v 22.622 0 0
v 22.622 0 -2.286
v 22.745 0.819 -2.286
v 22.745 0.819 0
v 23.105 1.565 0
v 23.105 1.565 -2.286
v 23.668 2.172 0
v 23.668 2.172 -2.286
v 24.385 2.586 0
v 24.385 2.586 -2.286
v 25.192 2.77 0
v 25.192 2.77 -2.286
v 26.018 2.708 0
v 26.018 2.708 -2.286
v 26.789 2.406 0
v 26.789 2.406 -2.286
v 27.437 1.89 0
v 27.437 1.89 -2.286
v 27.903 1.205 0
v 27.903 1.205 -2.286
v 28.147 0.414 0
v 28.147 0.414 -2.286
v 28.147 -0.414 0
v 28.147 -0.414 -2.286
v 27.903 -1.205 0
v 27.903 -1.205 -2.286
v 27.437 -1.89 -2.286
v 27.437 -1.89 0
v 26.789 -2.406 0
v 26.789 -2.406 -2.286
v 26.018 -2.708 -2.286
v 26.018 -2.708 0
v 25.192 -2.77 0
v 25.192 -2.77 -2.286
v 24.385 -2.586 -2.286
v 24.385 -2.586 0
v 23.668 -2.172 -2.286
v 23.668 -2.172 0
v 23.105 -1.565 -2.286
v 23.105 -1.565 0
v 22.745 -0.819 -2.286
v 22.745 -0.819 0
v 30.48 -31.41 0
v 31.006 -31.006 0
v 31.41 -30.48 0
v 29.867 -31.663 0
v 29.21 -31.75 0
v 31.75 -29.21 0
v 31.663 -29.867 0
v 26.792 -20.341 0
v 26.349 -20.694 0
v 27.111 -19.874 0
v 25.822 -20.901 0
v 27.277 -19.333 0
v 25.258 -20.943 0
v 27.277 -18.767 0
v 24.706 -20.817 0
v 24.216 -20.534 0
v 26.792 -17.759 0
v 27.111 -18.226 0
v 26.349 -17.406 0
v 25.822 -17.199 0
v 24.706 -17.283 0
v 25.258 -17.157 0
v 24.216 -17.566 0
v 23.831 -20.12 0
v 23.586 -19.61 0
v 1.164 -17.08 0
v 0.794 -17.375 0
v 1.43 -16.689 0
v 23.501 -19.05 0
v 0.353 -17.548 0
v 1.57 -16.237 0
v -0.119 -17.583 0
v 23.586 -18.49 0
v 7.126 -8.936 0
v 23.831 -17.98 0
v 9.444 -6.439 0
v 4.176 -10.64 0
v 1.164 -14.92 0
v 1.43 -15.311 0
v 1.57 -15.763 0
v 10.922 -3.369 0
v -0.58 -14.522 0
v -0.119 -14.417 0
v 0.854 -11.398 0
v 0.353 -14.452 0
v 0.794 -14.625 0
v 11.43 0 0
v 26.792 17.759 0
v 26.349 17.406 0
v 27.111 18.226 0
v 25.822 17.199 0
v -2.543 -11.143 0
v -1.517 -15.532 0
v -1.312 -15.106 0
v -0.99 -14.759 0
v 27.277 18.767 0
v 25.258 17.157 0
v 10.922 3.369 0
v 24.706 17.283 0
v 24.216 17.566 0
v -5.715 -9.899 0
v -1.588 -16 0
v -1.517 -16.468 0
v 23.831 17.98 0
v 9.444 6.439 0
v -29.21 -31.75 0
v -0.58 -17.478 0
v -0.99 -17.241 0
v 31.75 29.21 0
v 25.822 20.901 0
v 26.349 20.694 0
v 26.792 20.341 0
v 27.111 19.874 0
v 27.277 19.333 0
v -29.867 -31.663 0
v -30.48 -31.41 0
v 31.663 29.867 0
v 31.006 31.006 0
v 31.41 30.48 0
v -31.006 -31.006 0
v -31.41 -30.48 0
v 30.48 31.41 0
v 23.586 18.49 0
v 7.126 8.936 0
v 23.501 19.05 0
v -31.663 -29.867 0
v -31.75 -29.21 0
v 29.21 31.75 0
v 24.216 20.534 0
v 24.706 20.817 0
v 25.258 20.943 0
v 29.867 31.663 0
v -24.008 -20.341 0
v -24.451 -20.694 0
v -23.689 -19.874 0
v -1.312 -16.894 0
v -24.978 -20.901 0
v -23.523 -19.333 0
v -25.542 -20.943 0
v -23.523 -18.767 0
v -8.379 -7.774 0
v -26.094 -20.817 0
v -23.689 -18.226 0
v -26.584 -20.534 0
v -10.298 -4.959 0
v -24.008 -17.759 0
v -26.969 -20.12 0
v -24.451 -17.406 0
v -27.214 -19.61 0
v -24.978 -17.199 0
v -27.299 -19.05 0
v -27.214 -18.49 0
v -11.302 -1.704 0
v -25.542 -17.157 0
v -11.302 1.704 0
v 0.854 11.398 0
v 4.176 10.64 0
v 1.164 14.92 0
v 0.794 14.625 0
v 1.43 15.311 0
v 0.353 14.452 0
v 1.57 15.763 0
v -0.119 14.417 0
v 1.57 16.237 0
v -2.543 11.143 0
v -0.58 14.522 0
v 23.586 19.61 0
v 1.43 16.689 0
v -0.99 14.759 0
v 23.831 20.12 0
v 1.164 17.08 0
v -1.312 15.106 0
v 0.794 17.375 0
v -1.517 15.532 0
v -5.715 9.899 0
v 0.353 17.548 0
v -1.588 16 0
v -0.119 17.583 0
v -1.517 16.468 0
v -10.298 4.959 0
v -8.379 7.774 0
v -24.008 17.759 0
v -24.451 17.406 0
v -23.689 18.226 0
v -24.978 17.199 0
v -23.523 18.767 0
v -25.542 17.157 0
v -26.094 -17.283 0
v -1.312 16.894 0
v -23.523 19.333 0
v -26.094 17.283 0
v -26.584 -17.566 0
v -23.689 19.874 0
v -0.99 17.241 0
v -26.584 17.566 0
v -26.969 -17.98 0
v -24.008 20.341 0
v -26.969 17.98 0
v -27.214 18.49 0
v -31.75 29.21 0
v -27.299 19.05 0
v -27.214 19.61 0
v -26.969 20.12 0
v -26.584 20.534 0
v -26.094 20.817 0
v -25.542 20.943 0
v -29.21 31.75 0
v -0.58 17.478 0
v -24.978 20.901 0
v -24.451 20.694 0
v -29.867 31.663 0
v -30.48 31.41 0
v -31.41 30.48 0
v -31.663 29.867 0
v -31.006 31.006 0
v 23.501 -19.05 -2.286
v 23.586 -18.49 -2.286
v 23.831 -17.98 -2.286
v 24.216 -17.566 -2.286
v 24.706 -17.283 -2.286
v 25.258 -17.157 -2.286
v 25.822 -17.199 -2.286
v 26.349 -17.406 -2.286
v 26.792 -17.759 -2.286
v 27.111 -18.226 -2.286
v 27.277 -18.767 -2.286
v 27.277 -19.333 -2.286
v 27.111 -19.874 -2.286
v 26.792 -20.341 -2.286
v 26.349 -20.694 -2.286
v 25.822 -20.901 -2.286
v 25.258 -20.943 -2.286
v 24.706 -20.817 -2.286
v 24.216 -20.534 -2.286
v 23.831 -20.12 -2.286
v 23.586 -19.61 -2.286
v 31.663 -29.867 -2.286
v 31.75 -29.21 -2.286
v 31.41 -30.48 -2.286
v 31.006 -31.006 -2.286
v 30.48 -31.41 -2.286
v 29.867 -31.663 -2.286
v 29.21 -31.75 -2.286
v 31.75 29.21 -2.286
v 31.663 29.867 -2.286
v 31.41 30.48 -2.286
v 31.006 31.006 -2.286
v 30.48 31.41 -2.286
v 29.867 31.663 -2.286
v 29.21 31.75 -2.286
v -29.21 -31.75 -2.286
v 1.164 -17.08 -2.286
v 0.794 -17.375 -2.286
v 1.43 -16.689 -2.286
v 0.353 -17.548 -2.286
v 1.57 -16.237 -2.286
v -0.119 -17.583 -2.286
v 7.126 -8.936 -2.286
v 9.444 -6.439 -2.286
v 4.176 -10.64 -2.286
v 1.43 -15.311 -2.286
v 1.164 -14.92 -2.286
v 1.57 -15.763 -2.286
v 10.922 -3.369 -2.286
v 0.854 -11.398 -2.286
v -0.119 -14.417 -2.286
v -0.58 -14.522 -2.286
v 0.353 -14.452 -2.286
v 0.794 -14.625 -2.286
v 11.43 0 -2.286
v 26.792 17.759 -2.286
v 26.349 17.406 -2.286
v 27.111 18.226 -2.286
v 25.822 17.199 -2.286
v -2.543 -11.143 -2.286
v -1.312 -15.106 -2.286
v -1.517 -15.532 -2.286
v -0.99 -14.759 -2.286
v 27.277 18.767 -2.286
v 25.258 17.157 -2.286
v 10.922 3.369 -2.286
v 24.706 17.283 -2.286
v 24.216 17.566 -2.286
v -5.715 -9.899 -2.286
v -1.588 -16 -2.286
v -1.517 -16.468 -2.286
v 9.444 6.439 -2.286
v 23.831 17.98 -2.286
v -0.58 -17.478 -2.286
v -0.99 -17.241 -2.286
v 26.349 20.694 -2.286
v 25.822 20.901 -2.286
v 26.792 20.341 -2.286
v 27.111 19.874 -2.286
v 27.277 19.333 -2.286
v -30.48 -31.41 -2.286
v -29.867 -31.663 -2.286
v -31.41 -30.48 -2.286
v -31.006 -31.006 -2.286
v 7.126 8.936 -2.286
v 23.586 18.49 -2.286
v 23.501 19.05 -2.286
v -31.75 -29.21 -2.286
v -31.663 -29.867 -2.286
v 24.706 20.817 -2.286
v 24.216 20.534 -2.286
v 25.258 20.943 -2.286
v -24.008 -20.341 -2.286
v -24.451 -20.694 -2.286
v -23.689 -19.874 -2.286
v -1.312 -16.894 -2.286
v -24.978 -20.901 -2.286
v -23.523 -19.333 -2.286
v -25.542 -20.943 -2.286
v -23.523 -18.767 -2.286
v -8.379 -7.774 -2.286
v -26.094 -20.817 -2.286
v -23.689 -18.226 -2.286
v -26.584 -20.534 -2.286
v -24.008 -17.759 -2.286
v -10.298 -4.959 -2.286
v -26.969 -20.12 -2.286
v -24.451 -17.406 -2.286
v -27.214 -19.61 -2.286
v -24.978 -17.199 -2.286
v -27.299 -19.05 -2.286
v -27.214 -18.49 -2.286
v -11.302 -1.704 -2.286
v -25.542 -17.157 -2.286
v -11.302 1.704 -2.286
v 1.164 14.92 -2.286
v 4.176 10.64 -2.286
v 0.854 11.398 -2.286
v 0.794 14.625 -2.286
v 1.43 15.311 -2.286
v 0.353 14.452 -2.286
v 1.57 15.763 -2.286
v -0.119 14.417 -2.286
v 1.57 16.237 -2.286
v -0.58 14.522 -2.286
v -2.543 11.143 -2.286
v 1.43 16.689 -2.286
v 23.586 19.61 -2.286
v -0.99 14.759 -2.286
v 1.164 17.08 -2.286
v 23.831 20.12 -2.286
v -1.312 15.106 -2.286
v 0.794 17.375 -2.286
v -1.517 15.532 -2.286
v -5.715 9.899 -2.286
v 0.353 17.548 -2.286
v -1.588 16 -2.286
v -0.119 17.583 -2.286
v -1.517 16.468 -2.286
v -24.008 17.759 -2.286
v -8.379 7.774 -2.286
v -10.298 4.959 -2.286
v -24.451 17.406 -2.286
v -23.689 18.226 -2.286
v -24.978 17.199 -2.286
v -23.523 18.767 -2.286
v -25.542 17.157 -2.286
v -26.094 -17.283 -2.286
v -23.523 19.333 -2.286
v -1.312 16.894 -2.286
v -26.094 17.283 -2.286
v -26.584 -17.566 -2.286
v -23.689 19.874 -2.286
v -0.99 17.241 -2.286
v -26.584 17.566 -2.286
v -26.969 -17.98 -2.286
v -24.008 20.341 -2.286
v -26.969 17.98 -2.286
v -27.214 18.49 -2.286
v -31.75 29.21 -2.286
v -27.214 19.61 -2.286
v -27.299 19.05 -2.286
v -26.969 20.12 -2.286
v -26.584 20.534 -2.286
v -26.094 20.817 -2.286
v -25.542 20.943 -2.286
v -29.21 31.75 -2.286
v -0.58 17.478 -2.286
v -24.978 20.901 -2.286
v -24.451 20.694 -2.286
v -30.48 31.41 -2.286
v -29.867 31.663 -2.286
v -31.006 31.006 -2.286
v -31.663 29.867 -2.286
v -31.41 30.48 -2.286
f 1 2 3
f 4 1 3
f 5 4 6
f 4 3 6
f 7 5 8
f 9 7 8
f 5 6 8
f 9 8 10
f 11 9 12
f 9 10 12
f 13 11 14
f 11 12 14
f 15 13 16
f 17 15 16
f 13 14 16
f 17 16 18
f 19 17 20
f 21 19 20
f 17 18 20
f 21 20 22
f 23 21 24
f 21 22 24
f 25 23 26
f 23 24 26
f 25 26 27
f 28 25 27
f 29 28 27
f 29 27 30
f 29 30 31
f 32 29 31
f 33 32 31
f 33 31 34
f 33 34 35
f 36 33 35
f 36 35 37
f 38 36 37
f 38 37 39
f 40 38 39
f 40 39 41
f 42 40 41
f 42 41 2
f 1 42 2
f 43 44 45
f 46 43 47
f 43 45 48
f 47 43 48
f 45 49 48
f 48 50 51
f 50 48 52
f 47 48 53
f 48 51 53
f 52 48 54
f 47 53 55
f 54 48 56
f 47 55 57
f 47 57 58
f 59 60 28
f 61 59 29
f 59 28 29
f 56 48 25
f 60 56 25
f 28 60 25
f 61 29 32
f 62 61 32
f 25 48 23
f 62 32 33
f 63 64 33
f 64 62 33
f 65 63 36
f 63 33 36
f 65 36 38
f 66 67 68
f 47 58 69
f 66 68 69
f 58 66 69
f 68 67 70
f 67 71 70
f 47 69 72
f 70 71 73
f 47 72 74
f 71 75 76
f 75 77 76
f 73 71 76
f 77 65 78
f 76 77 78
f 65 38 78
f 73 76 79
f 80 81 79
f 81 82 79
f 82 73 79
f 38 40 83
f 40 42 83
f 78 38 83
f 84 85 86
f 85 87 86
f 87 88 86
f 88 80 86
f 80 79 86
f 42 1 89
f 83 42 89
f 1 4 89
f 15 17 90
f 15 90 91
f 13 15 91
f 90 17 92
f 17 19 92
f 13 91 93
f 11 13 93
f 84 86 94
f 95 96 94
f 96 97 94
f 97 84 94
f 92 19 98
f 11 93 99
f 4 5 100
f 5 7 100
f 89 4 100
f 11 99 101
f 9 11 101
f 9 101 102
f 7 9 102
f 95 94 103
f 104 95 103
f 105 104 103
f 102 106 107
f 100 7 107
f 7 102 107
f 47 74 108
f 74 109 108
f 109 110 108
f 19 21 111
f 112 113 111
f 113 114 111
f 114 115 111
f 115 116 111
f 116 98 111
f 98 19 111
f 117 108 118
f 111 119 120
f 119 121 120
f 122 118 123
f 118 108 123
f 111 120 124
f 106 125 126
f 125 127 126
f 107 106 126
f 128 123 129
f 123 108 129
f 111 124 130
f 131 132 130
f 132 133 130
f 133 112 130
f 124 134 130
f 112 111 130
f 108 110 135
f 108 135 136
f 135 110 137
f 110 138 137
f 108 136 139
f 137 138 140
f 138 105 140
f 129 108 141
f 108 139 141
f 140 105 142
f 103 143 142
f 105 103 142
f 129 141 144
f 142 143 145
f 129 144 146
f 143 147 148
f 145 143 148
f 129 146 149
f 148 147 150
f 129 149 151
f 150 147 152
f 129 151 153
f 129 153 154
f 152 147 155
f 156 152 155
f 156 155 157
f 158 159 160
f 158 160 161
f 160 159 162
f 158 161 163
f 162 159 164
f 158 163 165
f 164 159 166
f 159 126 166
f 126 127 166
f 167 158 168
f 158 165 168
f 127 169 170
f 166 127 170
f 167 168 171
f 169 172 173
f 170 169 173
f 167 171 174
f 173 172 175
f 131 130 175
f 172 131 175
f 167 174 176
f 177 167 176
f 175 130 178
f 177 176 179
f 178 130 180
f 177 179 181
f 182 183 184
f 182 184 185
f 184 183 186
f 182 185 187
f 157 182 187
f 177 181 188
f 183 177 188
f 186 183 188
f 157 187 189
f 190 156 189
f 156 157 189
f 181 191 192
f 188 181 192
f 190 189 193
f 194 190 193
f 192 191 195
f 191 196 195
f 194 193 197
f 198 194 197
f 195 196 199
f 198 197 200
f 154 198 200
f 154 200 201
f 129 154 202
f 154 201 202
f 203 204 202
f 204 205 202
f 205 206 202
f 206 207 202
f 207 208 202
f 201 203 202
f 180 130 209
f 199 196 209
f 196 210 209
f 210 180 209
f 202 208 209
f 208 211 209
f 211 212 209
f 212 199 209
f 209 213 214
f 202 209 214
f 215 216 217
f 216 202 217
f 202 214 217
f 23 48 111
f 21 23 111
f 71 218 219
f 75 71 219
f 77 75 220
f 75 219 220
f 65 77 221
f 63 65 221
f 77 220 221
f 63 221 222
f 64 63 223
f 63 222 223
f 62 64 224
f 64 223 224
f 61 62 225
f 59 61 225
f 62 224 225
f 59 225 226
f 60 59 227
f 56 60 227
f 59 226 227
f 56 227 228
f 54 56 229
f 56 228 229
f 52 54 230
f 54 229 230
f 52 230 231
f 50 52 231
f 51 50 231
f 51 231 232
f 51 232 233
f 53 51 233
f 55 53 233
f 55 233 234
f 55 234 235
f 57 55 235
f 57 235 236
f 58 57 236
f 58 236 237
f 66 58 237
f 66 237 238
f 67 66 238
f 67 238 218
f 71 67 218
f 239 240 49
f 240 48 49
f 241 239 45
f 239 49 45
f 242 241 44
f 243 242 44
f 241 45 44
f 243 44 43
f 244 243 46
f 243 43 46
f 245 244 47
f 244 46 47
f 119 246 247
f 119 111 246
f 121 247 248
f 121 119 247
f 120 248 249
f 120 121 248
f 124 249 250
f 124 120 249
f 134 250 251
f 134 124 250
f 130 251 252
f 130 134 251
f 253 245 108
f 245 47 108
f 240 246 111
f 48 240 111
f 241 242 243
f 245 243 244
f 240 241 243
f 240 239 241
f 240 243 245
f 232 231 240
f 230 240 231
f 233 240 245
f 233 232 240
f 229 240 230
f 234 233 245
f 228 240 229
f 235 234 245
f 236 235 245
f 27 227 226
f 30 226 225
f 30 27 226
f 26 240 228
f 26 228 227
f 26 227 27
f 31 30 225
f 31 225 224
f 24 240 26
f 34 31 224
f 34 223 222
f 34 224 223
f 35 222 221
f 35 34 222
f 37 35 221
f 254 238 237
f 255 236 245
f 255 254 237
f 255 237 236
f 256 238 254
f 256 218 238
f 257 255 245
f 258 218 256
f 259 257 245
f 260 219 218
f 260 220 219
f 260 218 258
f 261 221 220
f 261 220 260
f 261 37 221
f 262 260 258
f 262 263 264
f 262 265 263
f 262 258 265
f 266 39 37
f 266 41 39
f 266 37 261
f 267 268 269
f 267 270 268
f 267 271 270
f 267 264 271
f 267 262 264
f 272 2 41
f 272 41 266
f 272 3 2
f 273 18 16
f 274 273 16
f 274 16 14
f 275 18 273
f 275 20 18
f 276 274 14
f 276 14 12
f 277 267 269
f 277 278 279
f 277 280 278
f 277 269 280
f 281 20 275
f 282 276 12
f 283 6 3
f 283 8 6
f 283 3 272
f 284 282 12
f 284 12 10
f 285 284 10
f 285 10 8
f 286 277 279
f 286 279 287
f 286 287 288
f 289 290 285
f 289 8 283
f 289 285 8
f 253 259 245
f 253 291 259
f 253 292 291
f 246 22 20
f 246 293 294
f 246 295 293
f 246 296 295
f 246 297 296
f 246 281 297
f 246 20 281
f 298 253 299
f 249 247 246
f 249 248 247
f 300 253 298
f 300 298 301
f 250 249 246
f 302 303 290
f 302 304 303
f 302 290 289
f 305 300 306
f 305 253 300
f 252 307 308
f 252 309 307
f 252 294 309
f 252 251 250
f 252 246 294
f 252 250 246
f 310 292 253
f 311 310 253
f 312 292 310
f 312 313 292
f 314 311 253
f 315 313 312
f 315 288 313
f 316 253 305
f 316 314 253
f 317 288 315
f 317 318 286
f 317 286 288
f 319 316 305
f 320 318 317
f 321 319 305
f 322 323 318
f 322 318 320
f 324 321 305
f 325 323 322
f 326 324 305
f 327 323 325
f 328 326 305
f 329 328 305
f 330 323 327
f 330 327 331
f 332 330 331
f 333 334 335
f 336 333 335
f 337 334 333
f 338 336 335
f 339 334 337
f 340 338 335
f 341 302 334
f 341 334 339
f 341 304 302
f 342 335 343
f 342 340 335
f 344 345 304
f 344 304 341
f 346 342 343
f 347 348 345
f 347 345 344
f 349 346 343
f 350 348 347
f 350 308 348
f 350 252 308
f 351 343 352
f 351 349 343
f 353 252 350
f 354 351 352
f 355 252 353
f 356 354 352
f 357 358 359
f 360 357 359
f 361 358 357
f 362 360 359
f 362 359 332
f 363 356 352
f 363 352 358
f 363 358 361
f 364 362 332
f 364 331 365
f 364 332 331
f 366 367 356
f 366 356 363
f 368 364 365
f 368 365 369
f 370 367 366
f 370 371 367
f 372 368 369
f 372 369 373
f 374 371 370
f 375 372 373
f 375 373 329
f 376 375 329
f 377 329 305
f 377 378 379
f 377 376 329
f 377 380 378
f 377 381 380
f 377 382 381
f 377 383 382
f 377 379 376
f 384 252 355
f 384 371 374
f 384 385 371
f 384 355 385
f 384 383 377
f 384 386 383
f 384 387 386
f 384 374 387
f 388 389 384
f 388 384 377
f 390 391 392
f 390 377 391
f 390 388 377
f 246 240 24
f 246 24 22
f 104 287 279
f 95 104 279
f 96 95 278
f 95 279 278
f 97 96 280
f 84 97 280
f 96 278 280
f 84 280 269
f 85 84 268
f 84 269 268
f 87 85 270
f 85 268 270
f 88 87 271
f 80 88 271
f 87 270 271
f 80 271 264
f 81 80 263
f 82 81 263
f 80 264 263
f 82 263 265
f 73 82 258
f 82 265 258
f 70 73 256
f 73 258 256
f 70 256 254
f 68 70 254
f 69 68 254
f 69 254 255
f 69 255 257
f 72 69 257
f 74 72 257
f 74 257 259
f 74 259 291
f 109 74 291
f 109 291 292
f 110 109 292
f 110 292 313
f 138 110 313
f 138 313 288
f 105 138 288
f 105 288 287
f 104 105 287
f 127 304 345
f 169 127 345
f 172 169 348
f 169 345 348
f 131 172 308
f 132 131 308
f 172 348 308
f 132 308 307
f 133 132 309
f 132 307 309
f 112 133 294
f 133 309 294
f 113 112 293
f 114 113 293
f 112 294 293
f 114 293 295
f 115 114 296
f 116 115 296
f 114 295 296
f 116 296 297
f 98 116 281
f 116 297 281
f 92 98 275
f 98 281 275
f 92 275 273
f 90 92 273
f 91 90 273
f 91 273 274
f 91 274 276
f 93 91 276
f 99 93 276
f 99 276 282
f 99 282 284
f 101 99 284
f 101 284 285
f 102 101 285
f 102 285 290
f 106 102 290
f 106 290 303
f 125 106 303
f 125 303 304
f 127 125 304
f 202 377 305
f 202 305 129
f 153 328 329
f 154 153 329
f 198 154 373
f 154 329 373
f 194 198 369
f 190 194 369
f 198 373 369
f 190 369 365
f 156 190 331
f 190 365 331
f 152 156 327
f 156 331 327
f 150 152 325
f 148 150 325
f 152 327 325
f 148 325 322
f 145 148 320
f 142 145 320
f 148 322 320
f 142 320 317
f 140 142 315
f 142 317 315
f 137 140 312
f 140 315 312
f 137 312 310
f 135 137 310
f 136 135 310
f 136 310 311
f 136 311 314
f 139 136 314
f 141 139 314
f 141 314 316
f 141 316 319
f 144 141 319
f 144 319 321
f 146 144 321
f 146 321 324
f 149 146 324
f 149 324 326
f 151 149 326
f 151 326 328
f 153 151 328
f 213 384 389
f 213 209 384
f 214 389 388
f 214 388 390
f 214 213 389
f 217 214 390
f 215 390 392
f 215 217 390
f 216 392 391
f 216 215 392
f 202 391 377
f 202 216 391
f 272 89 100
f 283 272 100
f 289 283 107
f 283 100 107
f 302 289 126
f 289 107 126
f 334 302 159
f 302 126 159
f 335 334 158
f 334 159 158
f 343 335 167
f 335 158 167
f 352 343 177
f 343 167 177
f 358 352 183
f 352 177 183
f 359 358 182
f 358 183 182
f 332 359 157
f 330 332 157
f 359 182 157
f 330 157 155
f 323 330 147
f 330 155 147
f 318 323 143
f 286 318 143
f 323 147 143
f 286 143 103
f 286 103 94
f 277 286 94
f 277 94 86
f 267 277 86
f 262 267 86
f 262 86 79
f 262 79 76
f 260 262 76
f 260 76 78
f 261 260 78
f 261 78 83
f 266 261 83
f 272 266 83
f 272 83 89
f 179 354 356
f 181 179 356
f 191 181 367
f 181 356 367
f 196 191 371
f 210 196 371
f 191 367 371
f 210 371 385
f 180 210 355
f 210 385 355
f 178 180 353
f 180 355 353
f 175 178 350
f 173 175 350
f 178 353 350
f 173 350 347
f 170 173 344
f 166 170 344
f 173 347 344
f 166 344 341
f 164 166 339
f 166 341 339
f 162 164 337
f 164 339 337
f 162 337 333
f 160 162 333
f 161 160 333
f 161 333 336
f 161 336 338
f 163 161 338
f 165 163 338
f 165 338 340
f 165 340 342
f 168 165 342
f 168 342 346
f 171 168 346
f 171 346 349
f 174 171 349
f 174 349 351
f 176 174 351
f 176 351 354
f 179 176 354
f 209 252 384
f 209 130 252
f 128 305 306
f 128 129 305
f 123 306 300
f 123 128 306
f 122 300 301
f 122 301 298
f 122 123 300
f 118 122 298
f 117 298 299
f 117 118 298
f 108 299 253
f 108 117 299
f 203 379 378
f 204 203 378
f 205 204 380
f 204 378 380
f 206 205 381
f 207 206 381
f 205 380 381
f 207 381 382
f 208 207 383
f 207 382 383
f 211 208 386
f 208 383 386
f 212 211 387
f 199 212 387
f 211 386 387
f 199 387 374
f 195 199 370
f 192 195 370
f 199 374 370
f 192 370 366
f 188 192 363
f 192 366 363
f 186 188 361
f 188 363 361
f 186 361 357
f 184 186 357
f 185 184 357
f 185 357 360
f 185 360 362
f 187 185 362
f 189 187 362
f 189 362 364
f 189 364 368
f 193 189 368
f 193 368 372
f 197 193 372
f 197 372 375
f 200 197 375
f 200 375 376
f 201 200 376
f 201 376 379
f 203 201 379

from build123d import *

# Parameters (mm, degrees)
SKETCH3_W                       = 63.5
SKETCH3_H                       = 2.286
BASE_FLANGE1_DEPTH              = 31.75
FILLET1_R                       = 2.54
F_25_0_1495_DIAMETER_HOLE1_D    = 3.7973
SKETCH10_R                      = 11.43
CUT_EXTRUDE1_DEPTH              = 45.959435005
F_7_32_0_21875_DIAMETER_HOLE1_D = 5.55625
F_1_8_0_125_DIAMETER_HOLE1_D    = 3.175


# Sheet-metal steps are written as plain solids
with BuildPart() as part:
    # Sketch3 → Base-Flange1 (new, symmetric)
    with BuildSketch(Plane(origin=(0, 0, 0), x_dir=(-1, 0, 0), z_dir=(0, 1, 0))):
        with Locations((0, -1.143)):
            Rectangle(SKETCH3_W, SKETCH3_H)
    extrude(amount=BASE_FLANGE1_DEPTH, both=True)

    # Fillet1
    fillet1_edges = [part.edges().sort_by_distance(p)[0] for p in [
        (31.75, 31.75, -1.143),
        (31.75, -31.75, -1.143),
        (-31.75, -31.75, -1.143),
        (-31.75, 31.75, -1.143),
    ]]
    fillet(fillet1_edges, radius=FILLET1_R)

    # #25 (0.1495) Diameter Hole1 (through all)
    with Locations(Plane.XY):
        with Locations((-25.4, 19.05), (25.4, 19.05), (25.4, -19.05), (-25.4, -19.05)):
            Hole(F_25_0_1495_DIAMETER_HOLE1_D / 2)

    # Sketch10 → Cut-Extrude1 (cut, through all)
    with BuildSketch(Plane.XY):
        Circle(SKETCH10_R)
    extrude(amount=-CUT_EXTRUDE1_DEPTH, mode=Mode.SUBTRACT)

    # 7/32 (0.21875) Diameter Hole1 (through all)
    with Locations(Plane.XY):
        with Locations((25.4, 0)):
            Hole(F_7_32_0_21875_DIAMETER_HOLE1_D / 2)

    # 1/8 (0.125) Diameter Hole1 (through all)
    with Locations(Plane.XY):
        with Locations((0, 16), (0, -16)):
            Hole(F_1_8_0_125_DIAMETER_HOLE1_D / 2)


solid = part.part
